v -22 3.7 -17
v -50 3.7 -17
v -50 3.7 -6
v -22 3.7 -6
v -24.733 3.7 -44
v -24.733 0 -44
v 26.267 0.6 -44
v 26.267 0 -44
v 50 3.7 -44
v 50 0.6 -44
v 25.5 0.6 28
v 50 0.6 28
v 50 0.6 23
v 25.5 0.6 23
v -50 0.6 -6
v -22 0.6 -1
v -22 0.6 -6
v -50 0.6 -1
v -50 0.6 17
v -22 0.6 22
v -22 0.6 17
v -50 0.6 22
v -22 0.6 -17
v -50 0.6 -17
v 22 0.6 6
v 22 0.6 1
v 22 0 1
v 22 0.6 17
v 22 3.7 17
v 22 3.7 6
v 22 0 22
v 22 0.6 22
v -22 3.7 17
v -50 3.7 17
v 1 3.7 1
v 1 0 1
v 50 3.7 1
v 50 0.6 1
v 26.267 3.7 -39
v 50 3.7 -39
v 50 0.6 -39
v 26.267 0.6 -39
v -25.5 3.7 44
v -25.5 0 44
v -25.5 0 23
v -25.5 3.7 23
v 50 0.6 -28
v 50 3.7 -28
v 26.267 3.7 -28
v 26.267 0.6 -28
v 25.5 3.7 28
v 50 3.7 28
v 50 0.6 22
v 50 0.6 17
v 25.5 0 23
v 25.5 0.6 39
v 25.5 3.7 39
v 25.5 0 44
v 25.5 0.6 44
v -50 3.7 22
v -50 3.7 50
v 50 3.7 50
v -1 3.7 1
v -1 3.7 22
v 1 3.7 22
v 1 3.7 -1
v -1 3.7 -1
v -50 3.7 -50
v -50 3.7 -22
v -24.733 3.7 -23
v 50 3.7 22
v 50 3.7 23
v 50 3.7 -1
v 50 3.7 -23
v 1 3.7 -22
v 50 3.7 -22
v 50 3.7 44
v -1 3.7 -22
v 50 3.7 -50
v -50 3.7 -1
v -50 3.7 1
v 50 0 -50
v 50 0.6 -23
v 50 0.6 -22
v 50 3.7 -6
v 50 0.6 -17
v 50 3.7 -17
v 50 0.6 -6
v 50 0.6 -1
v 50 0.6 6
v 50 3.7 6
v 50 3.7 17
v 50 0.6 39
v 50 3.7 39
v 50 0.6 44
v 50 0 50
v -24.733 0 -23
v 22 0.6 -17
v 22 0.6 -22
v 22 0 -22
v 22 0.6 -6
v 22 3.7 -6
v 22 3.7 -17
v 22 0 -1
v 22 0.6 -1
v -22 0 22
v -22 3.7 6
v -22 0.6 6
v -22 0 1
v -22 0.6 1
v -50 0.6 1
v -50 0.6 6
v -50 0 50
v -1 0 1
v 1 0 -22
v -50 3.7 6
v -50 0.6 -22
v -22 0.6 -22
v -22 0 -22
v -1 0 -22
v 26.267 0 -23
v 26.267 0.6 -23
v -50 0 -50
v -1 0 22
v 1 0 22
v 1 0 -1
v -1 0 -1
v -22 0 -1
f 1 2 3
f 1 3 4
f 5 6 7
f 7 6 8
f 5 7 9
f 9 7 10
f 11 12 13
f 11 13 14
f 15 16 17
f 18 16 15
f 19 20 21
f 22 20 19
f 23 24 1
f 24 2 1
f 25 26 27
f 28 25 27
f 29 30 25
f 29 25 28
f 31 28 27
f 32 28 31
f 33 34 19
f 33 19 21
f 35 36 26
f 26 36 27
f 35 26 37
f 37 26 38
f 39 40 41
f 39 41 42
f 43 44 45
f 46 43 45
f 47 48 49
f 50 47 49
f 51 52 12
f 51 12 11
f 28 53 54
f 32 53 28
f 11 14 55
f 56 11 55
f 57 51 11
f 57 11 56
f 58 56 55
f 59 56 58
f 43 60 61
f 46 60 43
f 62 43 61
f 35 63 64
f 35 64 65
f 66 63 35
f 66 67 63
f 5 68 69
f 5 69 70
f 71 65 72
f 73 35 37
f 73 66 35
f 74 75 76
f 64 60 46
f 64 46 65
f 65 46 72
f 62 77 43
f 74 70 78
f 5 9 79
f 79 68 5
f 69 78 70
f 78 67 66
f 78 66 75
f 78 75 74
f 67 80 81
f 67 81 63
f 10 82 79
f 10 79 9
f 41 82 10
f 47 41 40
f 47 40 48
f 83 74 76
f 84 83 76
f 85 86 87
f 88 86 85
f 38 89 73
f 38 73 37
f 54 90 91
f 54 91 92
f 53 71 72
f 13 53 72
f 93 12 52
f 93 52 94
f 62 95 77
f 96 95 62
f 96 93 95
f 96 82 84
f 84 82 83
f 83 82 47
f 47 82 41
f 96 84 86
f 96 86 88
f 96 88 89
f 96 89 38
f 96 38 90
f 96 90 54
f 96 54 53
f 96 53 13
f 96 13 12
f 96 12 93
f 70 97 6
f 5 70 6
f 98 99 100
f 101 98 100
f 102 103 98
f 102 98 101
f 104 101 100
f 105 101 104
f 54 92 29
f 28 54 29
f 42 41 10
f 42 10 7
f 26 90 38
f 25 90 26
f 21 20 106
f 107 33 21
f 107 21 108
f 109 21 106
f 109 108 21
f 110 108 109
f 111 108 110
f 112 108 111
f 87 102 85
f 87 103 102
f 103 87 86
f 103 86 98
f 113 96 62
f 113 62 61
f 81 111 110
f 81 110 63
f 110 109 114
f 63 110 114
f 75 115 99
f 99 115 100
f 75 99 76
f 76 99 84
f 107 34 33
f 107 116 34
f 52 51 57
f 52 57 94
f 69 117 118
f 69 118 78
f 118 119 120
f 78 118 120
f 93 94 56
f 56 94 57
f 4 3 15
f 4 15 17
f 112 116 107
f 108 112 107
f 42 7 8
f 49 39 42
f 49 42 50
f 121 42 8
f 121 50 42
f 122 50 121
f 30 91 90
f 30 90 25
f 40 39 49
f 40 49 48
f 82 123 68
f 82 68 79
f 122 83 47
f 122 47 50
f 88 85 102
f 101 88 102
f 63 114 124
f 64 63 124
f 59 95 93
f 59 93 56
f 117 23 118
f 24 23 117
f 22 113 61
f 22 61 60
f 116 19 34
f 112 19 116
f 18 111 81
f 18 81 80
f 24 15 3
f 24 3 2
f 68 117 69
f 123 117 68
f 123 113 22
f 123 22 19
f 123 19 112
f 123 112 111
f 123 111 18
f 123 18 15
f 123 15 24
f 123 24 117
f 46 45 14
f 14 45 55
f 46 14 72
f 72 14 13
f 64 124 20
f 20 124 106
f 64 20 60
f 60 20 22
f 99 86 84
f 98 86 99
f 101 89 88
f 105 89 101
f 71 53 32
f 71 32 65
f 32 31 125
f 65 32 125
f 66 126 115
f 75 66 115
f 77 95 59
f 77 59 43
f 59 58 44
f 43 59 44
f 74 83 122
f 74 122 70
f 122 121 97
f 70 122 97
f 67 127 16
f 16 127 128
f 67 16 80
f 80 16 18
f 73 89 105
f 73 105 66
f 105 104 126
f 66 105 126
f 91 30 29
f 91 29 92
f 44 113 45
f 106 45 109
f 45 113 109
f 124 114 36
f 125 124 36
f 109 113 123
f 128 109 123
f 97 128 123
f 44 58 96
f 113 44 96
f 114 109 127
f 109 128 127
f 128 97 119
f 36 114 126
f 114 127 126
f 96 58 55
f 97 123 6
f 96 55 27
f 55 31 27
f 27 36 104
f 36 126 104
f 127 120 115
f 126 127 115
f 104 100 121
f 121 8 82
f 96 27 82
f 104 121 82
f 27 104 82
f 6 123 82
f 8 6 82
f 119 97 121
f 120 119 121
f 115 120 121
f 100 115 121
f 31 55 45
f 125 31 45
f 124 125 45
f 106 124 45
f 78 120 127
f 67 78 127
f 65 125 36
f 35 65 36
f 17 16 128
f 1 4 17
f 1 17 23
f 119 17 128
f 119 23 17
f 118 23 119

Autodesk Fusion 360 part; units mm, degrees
sketch "スケッチ1" plane through (0, 0, 0) normal (0, 1, 0) x (1, 0, 0)
  line L0 (-50, 50) -> (50, 50)
  line L1 (50, 50) -> (50, -50)
  line L2 (50, -50) -> (-50, -50)
  line L3 (-50, -50) -> (-50, 50)
extrude "押し出し1" add sketch "スケッチ1" along normal blind 3.7
sketch "スケッチ2" plane through (0, 3.7, 0) normal (0, 1, 0) x (-1, 0, 0)
  line L0 (50, 50) -> (-50, 50)
  line L1 (-50, 50) -> (-50, -50)
  line L2 (-50, -50) -> (50, -50)
  line L3 (50, -50) -> (50, 50)
  line L4 (24.7329, -44) -> (-26.2671, -44)
  line L5 (-26.2671, -44) -> (-26.2671, -23)
  line L6 (-26.2671, -23) -> (24.7329, -23)
  line L7 (24.7329, -23) -> (24.7329, -44)
  dimension "d3" = 51
  dimension "d4" = 21
  dimension "d5" = 6
  dimension "d6" = 23.7329
extrude "押し出し2" cut sketch "スケッチ2" against normal blind 3.7 contours L4 L5 L6 L7
sketch "スケッチ3" plane through (0, 3.7, 0) normal (0, 1, 0) x (-1, 0, 0)
  line L0 (-26.2671, -44) -> (-26.2671, -23)
  line L1 (-26.2671, -23) -> (24.7329, -23)
  line L2 (24.7329, -23) -> (24.7329, -44)
  line L3 (24.7329, -44) -> (-26.2671, -44)
  line L4 (50, 50) -> (-50, 50)
  line L5 (-50, 50) -> (-50, -50)
  line L6 (-50, -50) -> (50, -50)
  line L7 (50, -50) -> (50, 50)
  line L8 (-26.2671, -44) -> (-50.7671, -44)
  line L9 (-50.7671, -44) -> (-50.7671, -39)
  line L10 (-50.7671, -39) -> (-26.2671, -39)
  line L11 (-26.2671, -39) -> (-26.2671, -44)
  line L12 (-26.2671, -23) -> (-50.7671, -23)
  line L13 (-50.7671, -23) -> (-50.7671, -28)
  line L14 (-50.7671, -28) -> (-26.2671, -28)
  line L15 (-26.2671, -28) -> (-26.2671, -23)
  dimension "d9" = 24.5
  dimension "d10" = 5
  dimension "d11" = 24.5
  dimension "d12" = 5
extrude "押し出し3" cut sketch "スケッチ3" against normal blind 2.6 contours L0 L5 L8 L10 L11 | L0 L5 L12 L14 L15
sketch "スケッチ4" plane through (0, 3.7, 0) normal (0, 1, 0) x (-1, 0, 0)
  line L0 (-50, -23) -> (24.7329, -23)
  line L1 (24.7329, -23) -> (24.7329, -44)
  line L2 (24.7329, -44) -> (-50, -44)
  line L3 (-50, -44) -> (-50, -50)
  line L4 (-50, -50) -> (50, -50)
  line L5 (50, -50) -> (50, 50)
  line L6 (50, 50) -> (-50, 50)
  line L7 (-50, 50) -> (-50, -23)
  line L8 (-1, -22) -> (-22, -22)
  line L9 (-22, -22) -> (-22, -1)
  line L10 (-22, -1) -> (-1, -1)
  line L11 (-1, -1) -> (-1, -22)
  dimension "d15" = 21
  dimension "d16" = 21
  dimension "d17" = 1
  dimension "d18" = 28
extrude "押し出し4" cut sketch "スケッチ4" against normal blind 3.7 contours L8 L9 L10 L11
sketch "スケッチ5" plane through (0, 3.7, 0) normal (0, 1, 0) x (-1, 0, 0)
  line L0 (-22, -22) -> (-22, -1)
  line L1 (-22, -1) -> (-1, -1)
  line L2 (-1, -1) -> (-1, -22)
  line L3 (-1, -22) -> (-22, -22)
  line L4 (-50, -23) -> (24.7329, -23)
  line L5 (24.7329, -23) -> (24.7329, -44)
  line L6 (24.7329, -44) -> (-50, -44)
  line L7 (-50, -44) -> (-50, -50)
  line L8 (-50, -50) -> (50, -50)
  line L9 (50, -50) -> (50, 50)
  line L10 (50, 50) -> (-50, 50)
  line L11 (-50, 50) -> (-50, -23)
  line L12 (-22, -22) -> (-50, -22)
  line L13 (-50, -22) -> (-50, -17)
  line L14 (-50, -17) -> (-22, -17)
  line L15 (-22, -17) -> (-22, -22)
  line L16 (-22, -1) -> (-50, -1)
  line L17 (-50, -1) -> (-50, -6)
  line L18 (-50, -6) -> (-22, -6)
  line L19 (-22, -6) -> (-22, -1)
  dimension "d21" = 28
  dimension "d22" = 5
  dimension "d23" = 28
  dimension "d24" = 5
extrude "押し出し5" cut sketch "スケッチ5" against normal blind 2.7 contours L0 L11 L12 L13 L14 L15 | L0 L11 L16 L17 L18 L19
sketch "スケッチ6" plane through (0, 3.7, 0) normal (0, 1, 0) x (-1, 0, 0)
  line L0 (-50, -1) -> (-1, -1)
  line L1 (-1, -1) -> (-1, -22)
  line L2 (-1, -22) -> (-50, -22)
  line L3 (-50, -22) -> (-50, -23)
  line L4 (-50, -23) -> (24.7329, -23)
  line L5 (24.7329, -23) -> (24.7329, -44)
  line L6 (24.7329, -44) -> (-50, -44)
  line L7 (-50, -44) -> (-50, -50)
  line L8 (-50, -50) -> (50, -50)
  line L9 (50, -50) -> (50, 50)
  line L10 (50, 50) -> (-50, 50)
  line L11 (-50, 50) -> (-50, -1)
  line L12 (22, -22) -> (1, -22)
  line L13 (1, -22) -> (1, -1)
  line L14 (1, -1) -> (22, -1)
  line L15 (22, -1) -> (22, -22)
  dimension "d27" = 21
  dimension "d28" = 21
  dimension "d29" = 1
  dimension "d30" = 28
extrude "押し出し6" cut sketch "スケッチ6" against normal blind 3.7 contours L12 L13 L14 L15
sketch "スケッチ7" plane through (0, 3.7, 0) normal (0, 1, 0) x (-1, 0, 0)
  line L0 (1, -22) -> (1, -1)
  line L1 (1, -1) -> (22, -1)
  line L2 (22, -1) -> (22, -22)
  line L3 (22, -22) -> (1, -22)
  line L4 (-50, -1) -> (-1, -1)
  line L5 (-1, -1) -> (-1, -22)
  line L6 (-1, -22) -> (-50, -22)
  line L7 (-50, -22) -> (-50, -23)
  line L8 (-50, -23) -> (24.7329, -23)
  line L9 (24.7329, -23) -> (24.7329, -44)
  line L10 (24.7329, -44) -> (-50, -44)
  line L11 (-50, -44) -> (-50, -50)
  line L12 (-50, -50) -> (50, -50)
  line L13 (50, -50) -> (50, 50)
  line L14 (50, 50) -> (-50, 50)
  line L15 (-50, 50) -> (-50, -1)
  line L16 (22, -22) -> (50, -22)
  line L17 (50, -22) -> (50, -17)
  line L18 (50, -17) -> (22, -17)
  line L19 (22, -17) -> (22, -22)
  line L20 (22, -1) -> (50, -1)
  line L21 (50, -1) -> (50, -6)
  line L22 (50, -6) -> (22, -6)
  line L23 (22, -6) -> (22, -1)
  dimension "d33" = 28
  dimension "d34" = 5
  dimension "d35" = 28
  dimension "d36" = 5
extrude "押し出し7" cut sketch "スケッチ7" against normal blind 2.7 contours L2 L13 L16 L17 L18 L19 | L2 L13 L20 L21 L22 L23
sketch "スケッチ8" plane through (0, 3.7, 0) normal (0, 1, 0) x (-1, 0, 0)
  line L0 (1, -1) -> (50, -1)
  line L1 (50, -1) -> (50, 50)
  line L2 (50, 50) -> (-50, 50)
  line L3 (-50, 50) -> (-50, -1)
  line L4 (-50, -1) -> (-1, -1)
  line L5 (-1, -1) -> (-1, -22)
  line L6 (-1, -22) -> (-50, -22)
  line L7 (-50, -22) -> (-50, -23)
  line L8 (-50, -23) -> (24.7329, -23)
  line L9 (24.7329, -23) -> (24.7329, -44)
  line L10 (24.7329, -44) -> (-50, -44)
  line L11 (-50, -44) -> (-50, -50)
  line L12 (-50, -50) -> (50, -50)
  line L13 (50, -50) -> (50, -22)
  line L14 (50, -22) -> (1, -22)
  line L15 (1, -22) -> (1, -1)
  line L16 (-1, 1) -> (-22, 1)
  line L17 (-22, 1) -> (-22, 22)
  line L18 (-22, 22) -> (-1, 22)
  line L19 (-1, 22) -> (-1, 1)
  dimension "d39" = 21
  dimension "d40" = 21
  dimension "d41" = 2
  dimension "d42" = 28
extrude "押し出し8" cut sketch "スケッチ8" against normal blind 3.7 contours L16 L17 L18 L19
sketch "スケッチ9" plane through (0, 3.7, 0) normal (0, 1, 0) x (-1, 0, 0)
  line L0 (-22, 1) -> (-22, 22)
  line L1 (-22, 22) -> (-1, 22)
  line L2 (-1, 22) -> (-1, 1)
  line L3 (-1, 1) -> (-22, 1)
  line L4 (1, -1) -> (50, -1)
  line L5 (50, -1) -> (50, 50)
  line L6 (50, 50) -> (-50, 50)
  line L7 (-50, 50) -> (-50, -1)
  line L8 (-50, -1) -> (-1, -1)
  line L9 (-1, -1) -> (-1, -22)
  line L10 (-1, -22) -> (-50, -22)
  line L11 (-50, -22) -> (-50, -23)
  line L12 (-50, -23) -> (24.7329, -23)
  line L13 (24.7329, -23) -> (24.7329, -44)
  line L14 (24.7329, -44) -> (-50, -44)
  line L15 (-50, -44) -> (-50, -50)
  line L16 (-50, -50) -> (50, -50)
  line L17 (50, -50) -> (50, -22)
  line L18 (50, -22) -> (1, -22)
  line L19 (1, -22) -> (1, -1)
  line L20 (-22, 1) -> (-50, 1)
  line L21 (-50, 1) -> (-50, 6)
  line L22 (-50, 6) -> (-22, 6)
  line L23 (-22, 6) -> (-22, 1)
  line L24 (-22, 22) -> (-50, 22)
  line L25 (-50, 22) -> (-50, 17)
  line L26 (-50, 17) -> (-22, 17)
  line L27 (-22, 17) -> (-22, 22)
  dimension "d45" = 28
  dimension "d46" = 5
  dimension "d47" = 28
  dimension "d48" = 5
extrude "押し出し9" cut sketch "スケッチ9" against normal blind 2.7 contours L0 L7 L20 L21 L22 L23 | L0 L7 L24 L25 L26 L27
sketch "スケッチ10" plane through (0, 3.7, 0) normal (0, 1, 0) x (-1, 0, 0)
  line L0 (-1, 1) -> (-50, 1)
  line L1 (-50, 1) -> (-50, -1)
  line L2 (-50, -1) -> (-1, -1)
  line L3 (-1, -1) -> (-1, -22)
  line L4 (-1, -22) -> (-50, -22)
  line L5 (-50, -22) -> (-50, -23)
  line L6 (-50, -23) -> (24.7329, -23)
  line L7 (24.7329, -23) -> (24.7329, -44)
  line L8 (24.7329, -44) -> (-50, -44)
  line L9 (-50, -44) -> (-50, -50)
  line L10 (-50, -50) -> (50, -50)
  line L11 (50, -50) -> (50, -22)
  line L12 (50, -22) -> (1, -22)
  line L13 (1, -22) -> (1, -1)
  line L14 (1, -1) -> (50, -1)
  line L15 (50, -1) -> (50, 50)
  line L16 (50, 50) -> (-50, 50)
  line L17 (-50, 50) -> (-50, 22)
  line L18 (-50, 22) -> (-1, 22)
  line L19 (-1, 22) -> (-1, 1)
  line L20 (22, 1) -> (1, 1)
  line L21 (1, 1) -> (1, 22)
  line L22 (1, 22) -> (22, 22)
  line L23 (22, 22) -> (22, 1)
  dimension "d51" = 21
  dimension "d52" = 21
  dimension "d53" = 2
  dimension "d54" = 28
extrude "押し出し10" cut sketch "スケッチ10" against normal blind 3.7 contours L20 L21 L22 L23
sketch "スケッチ11" plane through (0, 3.7, 0) normal (0, 1, 0) x (-1, 0, 0)
  line L0 (1, 1) -> (1, 22)
  line L1 (1, 22) -> (22, 22)
  line L2 (22, 22) -> (22, 1)
  line L3 (22, 1) -> (1, 1)
  line L4 (-1, 1) -> (-50, 1)
  line L5 (-50, 1) -> (-50, -1)
  line L6 (-50, -1) -> (-1, -1)
  line L7 (-1, -1) -> (-1, -22)
  line L8 (-1, -22) -> (-50, -22)
  line L9 (-50, -22) -> (-50, -23)
  line L10 (-50, -23) -> (24.7329, -23)
  line L11 (24.7329, -23) -> (24.7329, -44)
  line L12 (24.7329, -44) -> (-50, -44)
  line L13 (-50, -44) -> (-50, -50)
  line L14 (-50, -50) -> (50, -50)
  line L15 (50, -50) -> (50, -22)
  line L16 (50, -22) -> (1, -22)
  line L17 (1, -22) -> (1, -1)
  line L18 (1, -1) -> (50, -1)
  line L19 (50, -1) -> (50, 50)
  line L20 (50, 50) -> (-50, 50)
  line L21 (-50, 50) -> (-50, 22)
  line L22 (-50, 22) -> (-1, 22)
  line L23 (-1, 22) -> (-1, 1)
  line L24 (22, 1) -> (50, 1)
  line L25 (50, 1) -> (50, 6)
  line L26 (50, 6) -> (22, 6)
  line L27 (22, 6) -> (22, 1)
  line L28 (22, 22) -> (50, 22)
  line L29 (50, 22) -> (50, 17)
  line L30 (50, 17) -> (22, 17)
  line L31 (22, 17) -> (22, 22)
  dimension "d57" = 28
  dimension "d58" = 5
  dimension "d59" = 28
  dimension "d60" = 5
extrude "押し出し11" cut sketch "スケッチ11" against normal blind 2.7 contours L2 L19 L24 L25 L26 L27 | L2 L19 L28 L29 L30 L31
sketch "スケッチ12" plane through (0, 3.7, 0) normal (0, 1, 0) x (-1, 0, 0)
  line L0 (50, 1) -> (1, 1)
  line L1 (1, 1) -> (1, 22)
  line L2 (1, 22) -> (50, 22)
  line L3 (50, 22) -> (50, 50)
  line L4 (50, 50) -> (-50, 50)
  line L5 (-50, 50) -> (-50, 22)
  line L6 (-50, 22) -> (-1, 22)
  line L7 (-1, 22) -> (-1, 1)
  line L8 (-1, 1) -> (-50, 1)
  line L9 (-50, 1) -> (-50, -1)
  line L10 (-50, -1) -> (-1, -1)
  line L11 (-1, -1) -> (-1, -22)
  line L12 (-1, -22) -> (-50, -22)
  line L13 (-50, -22) -> (-50, -23)
  line L14 (-50, -23) -> (24.7329, -23)
  line L15 (24.7329, -23) -> (24.7329, -44)
  line L16 (24.7329, -44) -> (-50, -44)
  line L17 (-50, -44) -> (-50, -50)
  line L18 (-50, -50) -> (50, -50)
  line L19 (50, -50) -> (50, -22)
  line L20 (50, -22) -> (1, -22)
  line L21 (1, -22) -> (1, -1)
  line L22 (1, -1) -> (50, -1)
  line L23 (50, -1) -> (50, 1)
  line L24 (25.5, 23) -> (-25.5, 23)
  line L25 (-25.5, 23) -> (-25.5, 44)
  line L26 (-25.5, 44) -> (25.5, 44)
  line L27 (25.5, 44) -> (25.5, 23)
  dimension "d63" = 51
  dimension "d64" = 21
  dimension "d65" = 24.5
  dimension "d66" = 1
extrude "押し出し12" cut sketch "スケッチ12" against normal blind 3.7 contours L24 L25 L26 L27
sketch "スケッチ13" plane through (0, 3.7, 0) normal (0, 1, 0) x (-1, 0, 0)
  line L0 (-25.5, 23) -> (-25.5, 44)
  line L1 (-25.5, 44) -> (25.5, 44)
  line L2 (25.5, 44) -> (25.5, 23)
  line L3 (25.5, 23) -> (-25.5, 23)
  line L4 (50, 1) -> (1, 1)
  line L5 (1, 1) -> (1, 22)
  line L6 (1, 22) -> (50, 22)
  line L7 (50, 22) -> (50, 50)
  line L8 (50, 50) -> (-50, 50)
  line L9 (-50, 50) -> (-50, 22)
  line L10 (-50, 22) -> (-1, 22)
  line L11 (-1, 22) -> (-1, 1)
  line L12 (-1, 1) -> (-50, 1)
  line L13 (-50, 1) -> (-50, -1)
  line L14 (-50, -1) -> (-1, -1)
  line L15 (-1, -1) -> (-1, -22)
  line L16 (-1, -22) -> (-50, -22)
  line L17 (-50, -22) -> (-50, -23)
  line L18 (-50, -23) -> (24.7329, -23)
  line L19 (24.7329, -23) -> (24.7329, -44)
  line L20 (24.7329, -44) -> (-50, -44)
  line L21 (-50, -44) -> (-50, -50)
  line L22 (-50, -50) -> (50, -50)
  line L23 (50, -50) -> (50, -22)
  line L24 (50, -22) -> (1, -22)
  line L25 (1, -22) -> (1, -1)
  line L26 (1, -1) -> (50, -1)
  line L27 (50, -1) -> (50, 1)
  line L28 (-25.5, 23) -> (-53.5, 23)
  line L29 (-53.5, 23) -> (-53.5, 28)
  line L30 (-53.5, 28) -> (-25.5, 28)
  line L31 (-25.5, 28) -> (-25.5, 23)
  line L32 (-25.5, 44) -> (-53.5, 44)
  line L33 (-53.5, 44) -> (-53.5, 39)
  line L34 (-53.5, 39) -> (-25.5, 39)
  line L35 (-25.5, 39) -> (-25.5, 44)
  dimension "d69" = 28
  dimension "d70" = 5
  dimension "d71" = 28
  dimension "d72" = 5
extrude "押し出し13" cut sketch "スケッチ13" against normal blind 2.7 contours L0 L9 L28 L30 L31 | L0 L9 L32 L34 L35
sketch "スケッチ14" plane through (0, 0, 0) normal (0, 1, 0) x (1, 0, 0)
extrude "押し出し14" add 2 faces at (33.6667, 1, 40.6667) (33.6667, 1, 24.6667) along direction (0, 1, 0) blind 2
extrude "押し出し15" cut 2 faces at (33.6667, 3, 40.6667) (33.6667, 3, 24.6667) along direction (0, -1, 0) blind 1.8
extrude "押し出し16" add 8 faces at (40.6667, 1, 20.3333) (40.6667, 1, 4.3333) (40.6667, 1, -2.6667) (40.6667, 1, -18.6667) (-31.3333, 1, -18.6667) (-31.3333, 1, -2.6667) (-31.3333, 1, 4.3333) (-31.3333, 1, 20.3333) along direction (0, 1, 0) blind 0.2
extrude "押し出し17" add 1 faces at (-41.5776, 3.7, -38.6667) along direction (0, 1, 0) blind 1
extrude "押し出し18" add 6 faces at (-40.6667, 3.7, -13.3333) (-40.6667, 3.7, 13.3333) (41.8333, 3.7, 35.3333) (31.3333, 3.7, 9.6667) (40.6667, 3.7, -9.6667) (42.089, 3.7, -35.3333) along direction (0, 1, 0) blind 1
sketch "スケッチ15" plane through (0, 0, 0) normal (0, 1, 0) x (1, 0, 0)
  line L0 (-50, -1) -> (-50, 1)
  line L1 (-50, 1) -> (-50, 6)
  line L2 (-50, 6) -> (-50, 17)
  line L3 (-50, 17) -> (-50, 22)
  line L4 (-50, 22) -> (-50, 50)
  line L5 (-50, 50) -> (-50, -50)
  line L6 (-50, -50) -> (-50, -22)
  line L7 (-50, -22) -> (-50, -17)
  line L8 (-50, -17) -> (-50, -6)
  line L9 (-50, -6) -> (-50, -1)
extrude "押し出し19" cut 10 faces at (33.6667, 1.2, 40.6667) (33.6667, 1.2, 24.6667) (40.6667, 1.2, 20.3333) (40.6667, 1.2, 4.3333) (40.6667, 1.2, -2.6667) (40.6667, 1.2, -18.6667) (-31.3333, 1.2, -18.6667) (-31.3333, 1.2, -2.6667) (-31.3333, 1.2, 4.3333) (-31.3333, 1.2, 20.3333) along direction (0, -1, 0) blind 0.6
extrude "押し出し20" cut 7 faces at (-41.5776, 4.7, -38.6667) (-40.6667, 4.7, 13.3333) (-40.6667, 4.7, -13.3333) (42.089, 4.7, -35.3333) (40.6667, 4.7, -9.6667) (31.3333, 4.7, 9.6667) (41.8333, 4.7, 35.3333) along direction (0, -1, 0) blind 1
extrude "押し出し21" cut 2 faces at (34.1781, 1.1, -26.3333) (34.1781, 1.1, -42.3333) along direction (0, -1, 0) blind 0.6
extrude "押し出し22" add 2 faces at (34.1781, 0.5, -42.3333) (34.1781, 0.5, -26.3333) along direction (0, 1, 0) blind 0.2
extrude "押し出し23" cut 2 faces at (34.1781, 0.7, -26.3333) (34.1781, 0.7, -42.3333) along direction (0, -1, 0) blind 0.1
